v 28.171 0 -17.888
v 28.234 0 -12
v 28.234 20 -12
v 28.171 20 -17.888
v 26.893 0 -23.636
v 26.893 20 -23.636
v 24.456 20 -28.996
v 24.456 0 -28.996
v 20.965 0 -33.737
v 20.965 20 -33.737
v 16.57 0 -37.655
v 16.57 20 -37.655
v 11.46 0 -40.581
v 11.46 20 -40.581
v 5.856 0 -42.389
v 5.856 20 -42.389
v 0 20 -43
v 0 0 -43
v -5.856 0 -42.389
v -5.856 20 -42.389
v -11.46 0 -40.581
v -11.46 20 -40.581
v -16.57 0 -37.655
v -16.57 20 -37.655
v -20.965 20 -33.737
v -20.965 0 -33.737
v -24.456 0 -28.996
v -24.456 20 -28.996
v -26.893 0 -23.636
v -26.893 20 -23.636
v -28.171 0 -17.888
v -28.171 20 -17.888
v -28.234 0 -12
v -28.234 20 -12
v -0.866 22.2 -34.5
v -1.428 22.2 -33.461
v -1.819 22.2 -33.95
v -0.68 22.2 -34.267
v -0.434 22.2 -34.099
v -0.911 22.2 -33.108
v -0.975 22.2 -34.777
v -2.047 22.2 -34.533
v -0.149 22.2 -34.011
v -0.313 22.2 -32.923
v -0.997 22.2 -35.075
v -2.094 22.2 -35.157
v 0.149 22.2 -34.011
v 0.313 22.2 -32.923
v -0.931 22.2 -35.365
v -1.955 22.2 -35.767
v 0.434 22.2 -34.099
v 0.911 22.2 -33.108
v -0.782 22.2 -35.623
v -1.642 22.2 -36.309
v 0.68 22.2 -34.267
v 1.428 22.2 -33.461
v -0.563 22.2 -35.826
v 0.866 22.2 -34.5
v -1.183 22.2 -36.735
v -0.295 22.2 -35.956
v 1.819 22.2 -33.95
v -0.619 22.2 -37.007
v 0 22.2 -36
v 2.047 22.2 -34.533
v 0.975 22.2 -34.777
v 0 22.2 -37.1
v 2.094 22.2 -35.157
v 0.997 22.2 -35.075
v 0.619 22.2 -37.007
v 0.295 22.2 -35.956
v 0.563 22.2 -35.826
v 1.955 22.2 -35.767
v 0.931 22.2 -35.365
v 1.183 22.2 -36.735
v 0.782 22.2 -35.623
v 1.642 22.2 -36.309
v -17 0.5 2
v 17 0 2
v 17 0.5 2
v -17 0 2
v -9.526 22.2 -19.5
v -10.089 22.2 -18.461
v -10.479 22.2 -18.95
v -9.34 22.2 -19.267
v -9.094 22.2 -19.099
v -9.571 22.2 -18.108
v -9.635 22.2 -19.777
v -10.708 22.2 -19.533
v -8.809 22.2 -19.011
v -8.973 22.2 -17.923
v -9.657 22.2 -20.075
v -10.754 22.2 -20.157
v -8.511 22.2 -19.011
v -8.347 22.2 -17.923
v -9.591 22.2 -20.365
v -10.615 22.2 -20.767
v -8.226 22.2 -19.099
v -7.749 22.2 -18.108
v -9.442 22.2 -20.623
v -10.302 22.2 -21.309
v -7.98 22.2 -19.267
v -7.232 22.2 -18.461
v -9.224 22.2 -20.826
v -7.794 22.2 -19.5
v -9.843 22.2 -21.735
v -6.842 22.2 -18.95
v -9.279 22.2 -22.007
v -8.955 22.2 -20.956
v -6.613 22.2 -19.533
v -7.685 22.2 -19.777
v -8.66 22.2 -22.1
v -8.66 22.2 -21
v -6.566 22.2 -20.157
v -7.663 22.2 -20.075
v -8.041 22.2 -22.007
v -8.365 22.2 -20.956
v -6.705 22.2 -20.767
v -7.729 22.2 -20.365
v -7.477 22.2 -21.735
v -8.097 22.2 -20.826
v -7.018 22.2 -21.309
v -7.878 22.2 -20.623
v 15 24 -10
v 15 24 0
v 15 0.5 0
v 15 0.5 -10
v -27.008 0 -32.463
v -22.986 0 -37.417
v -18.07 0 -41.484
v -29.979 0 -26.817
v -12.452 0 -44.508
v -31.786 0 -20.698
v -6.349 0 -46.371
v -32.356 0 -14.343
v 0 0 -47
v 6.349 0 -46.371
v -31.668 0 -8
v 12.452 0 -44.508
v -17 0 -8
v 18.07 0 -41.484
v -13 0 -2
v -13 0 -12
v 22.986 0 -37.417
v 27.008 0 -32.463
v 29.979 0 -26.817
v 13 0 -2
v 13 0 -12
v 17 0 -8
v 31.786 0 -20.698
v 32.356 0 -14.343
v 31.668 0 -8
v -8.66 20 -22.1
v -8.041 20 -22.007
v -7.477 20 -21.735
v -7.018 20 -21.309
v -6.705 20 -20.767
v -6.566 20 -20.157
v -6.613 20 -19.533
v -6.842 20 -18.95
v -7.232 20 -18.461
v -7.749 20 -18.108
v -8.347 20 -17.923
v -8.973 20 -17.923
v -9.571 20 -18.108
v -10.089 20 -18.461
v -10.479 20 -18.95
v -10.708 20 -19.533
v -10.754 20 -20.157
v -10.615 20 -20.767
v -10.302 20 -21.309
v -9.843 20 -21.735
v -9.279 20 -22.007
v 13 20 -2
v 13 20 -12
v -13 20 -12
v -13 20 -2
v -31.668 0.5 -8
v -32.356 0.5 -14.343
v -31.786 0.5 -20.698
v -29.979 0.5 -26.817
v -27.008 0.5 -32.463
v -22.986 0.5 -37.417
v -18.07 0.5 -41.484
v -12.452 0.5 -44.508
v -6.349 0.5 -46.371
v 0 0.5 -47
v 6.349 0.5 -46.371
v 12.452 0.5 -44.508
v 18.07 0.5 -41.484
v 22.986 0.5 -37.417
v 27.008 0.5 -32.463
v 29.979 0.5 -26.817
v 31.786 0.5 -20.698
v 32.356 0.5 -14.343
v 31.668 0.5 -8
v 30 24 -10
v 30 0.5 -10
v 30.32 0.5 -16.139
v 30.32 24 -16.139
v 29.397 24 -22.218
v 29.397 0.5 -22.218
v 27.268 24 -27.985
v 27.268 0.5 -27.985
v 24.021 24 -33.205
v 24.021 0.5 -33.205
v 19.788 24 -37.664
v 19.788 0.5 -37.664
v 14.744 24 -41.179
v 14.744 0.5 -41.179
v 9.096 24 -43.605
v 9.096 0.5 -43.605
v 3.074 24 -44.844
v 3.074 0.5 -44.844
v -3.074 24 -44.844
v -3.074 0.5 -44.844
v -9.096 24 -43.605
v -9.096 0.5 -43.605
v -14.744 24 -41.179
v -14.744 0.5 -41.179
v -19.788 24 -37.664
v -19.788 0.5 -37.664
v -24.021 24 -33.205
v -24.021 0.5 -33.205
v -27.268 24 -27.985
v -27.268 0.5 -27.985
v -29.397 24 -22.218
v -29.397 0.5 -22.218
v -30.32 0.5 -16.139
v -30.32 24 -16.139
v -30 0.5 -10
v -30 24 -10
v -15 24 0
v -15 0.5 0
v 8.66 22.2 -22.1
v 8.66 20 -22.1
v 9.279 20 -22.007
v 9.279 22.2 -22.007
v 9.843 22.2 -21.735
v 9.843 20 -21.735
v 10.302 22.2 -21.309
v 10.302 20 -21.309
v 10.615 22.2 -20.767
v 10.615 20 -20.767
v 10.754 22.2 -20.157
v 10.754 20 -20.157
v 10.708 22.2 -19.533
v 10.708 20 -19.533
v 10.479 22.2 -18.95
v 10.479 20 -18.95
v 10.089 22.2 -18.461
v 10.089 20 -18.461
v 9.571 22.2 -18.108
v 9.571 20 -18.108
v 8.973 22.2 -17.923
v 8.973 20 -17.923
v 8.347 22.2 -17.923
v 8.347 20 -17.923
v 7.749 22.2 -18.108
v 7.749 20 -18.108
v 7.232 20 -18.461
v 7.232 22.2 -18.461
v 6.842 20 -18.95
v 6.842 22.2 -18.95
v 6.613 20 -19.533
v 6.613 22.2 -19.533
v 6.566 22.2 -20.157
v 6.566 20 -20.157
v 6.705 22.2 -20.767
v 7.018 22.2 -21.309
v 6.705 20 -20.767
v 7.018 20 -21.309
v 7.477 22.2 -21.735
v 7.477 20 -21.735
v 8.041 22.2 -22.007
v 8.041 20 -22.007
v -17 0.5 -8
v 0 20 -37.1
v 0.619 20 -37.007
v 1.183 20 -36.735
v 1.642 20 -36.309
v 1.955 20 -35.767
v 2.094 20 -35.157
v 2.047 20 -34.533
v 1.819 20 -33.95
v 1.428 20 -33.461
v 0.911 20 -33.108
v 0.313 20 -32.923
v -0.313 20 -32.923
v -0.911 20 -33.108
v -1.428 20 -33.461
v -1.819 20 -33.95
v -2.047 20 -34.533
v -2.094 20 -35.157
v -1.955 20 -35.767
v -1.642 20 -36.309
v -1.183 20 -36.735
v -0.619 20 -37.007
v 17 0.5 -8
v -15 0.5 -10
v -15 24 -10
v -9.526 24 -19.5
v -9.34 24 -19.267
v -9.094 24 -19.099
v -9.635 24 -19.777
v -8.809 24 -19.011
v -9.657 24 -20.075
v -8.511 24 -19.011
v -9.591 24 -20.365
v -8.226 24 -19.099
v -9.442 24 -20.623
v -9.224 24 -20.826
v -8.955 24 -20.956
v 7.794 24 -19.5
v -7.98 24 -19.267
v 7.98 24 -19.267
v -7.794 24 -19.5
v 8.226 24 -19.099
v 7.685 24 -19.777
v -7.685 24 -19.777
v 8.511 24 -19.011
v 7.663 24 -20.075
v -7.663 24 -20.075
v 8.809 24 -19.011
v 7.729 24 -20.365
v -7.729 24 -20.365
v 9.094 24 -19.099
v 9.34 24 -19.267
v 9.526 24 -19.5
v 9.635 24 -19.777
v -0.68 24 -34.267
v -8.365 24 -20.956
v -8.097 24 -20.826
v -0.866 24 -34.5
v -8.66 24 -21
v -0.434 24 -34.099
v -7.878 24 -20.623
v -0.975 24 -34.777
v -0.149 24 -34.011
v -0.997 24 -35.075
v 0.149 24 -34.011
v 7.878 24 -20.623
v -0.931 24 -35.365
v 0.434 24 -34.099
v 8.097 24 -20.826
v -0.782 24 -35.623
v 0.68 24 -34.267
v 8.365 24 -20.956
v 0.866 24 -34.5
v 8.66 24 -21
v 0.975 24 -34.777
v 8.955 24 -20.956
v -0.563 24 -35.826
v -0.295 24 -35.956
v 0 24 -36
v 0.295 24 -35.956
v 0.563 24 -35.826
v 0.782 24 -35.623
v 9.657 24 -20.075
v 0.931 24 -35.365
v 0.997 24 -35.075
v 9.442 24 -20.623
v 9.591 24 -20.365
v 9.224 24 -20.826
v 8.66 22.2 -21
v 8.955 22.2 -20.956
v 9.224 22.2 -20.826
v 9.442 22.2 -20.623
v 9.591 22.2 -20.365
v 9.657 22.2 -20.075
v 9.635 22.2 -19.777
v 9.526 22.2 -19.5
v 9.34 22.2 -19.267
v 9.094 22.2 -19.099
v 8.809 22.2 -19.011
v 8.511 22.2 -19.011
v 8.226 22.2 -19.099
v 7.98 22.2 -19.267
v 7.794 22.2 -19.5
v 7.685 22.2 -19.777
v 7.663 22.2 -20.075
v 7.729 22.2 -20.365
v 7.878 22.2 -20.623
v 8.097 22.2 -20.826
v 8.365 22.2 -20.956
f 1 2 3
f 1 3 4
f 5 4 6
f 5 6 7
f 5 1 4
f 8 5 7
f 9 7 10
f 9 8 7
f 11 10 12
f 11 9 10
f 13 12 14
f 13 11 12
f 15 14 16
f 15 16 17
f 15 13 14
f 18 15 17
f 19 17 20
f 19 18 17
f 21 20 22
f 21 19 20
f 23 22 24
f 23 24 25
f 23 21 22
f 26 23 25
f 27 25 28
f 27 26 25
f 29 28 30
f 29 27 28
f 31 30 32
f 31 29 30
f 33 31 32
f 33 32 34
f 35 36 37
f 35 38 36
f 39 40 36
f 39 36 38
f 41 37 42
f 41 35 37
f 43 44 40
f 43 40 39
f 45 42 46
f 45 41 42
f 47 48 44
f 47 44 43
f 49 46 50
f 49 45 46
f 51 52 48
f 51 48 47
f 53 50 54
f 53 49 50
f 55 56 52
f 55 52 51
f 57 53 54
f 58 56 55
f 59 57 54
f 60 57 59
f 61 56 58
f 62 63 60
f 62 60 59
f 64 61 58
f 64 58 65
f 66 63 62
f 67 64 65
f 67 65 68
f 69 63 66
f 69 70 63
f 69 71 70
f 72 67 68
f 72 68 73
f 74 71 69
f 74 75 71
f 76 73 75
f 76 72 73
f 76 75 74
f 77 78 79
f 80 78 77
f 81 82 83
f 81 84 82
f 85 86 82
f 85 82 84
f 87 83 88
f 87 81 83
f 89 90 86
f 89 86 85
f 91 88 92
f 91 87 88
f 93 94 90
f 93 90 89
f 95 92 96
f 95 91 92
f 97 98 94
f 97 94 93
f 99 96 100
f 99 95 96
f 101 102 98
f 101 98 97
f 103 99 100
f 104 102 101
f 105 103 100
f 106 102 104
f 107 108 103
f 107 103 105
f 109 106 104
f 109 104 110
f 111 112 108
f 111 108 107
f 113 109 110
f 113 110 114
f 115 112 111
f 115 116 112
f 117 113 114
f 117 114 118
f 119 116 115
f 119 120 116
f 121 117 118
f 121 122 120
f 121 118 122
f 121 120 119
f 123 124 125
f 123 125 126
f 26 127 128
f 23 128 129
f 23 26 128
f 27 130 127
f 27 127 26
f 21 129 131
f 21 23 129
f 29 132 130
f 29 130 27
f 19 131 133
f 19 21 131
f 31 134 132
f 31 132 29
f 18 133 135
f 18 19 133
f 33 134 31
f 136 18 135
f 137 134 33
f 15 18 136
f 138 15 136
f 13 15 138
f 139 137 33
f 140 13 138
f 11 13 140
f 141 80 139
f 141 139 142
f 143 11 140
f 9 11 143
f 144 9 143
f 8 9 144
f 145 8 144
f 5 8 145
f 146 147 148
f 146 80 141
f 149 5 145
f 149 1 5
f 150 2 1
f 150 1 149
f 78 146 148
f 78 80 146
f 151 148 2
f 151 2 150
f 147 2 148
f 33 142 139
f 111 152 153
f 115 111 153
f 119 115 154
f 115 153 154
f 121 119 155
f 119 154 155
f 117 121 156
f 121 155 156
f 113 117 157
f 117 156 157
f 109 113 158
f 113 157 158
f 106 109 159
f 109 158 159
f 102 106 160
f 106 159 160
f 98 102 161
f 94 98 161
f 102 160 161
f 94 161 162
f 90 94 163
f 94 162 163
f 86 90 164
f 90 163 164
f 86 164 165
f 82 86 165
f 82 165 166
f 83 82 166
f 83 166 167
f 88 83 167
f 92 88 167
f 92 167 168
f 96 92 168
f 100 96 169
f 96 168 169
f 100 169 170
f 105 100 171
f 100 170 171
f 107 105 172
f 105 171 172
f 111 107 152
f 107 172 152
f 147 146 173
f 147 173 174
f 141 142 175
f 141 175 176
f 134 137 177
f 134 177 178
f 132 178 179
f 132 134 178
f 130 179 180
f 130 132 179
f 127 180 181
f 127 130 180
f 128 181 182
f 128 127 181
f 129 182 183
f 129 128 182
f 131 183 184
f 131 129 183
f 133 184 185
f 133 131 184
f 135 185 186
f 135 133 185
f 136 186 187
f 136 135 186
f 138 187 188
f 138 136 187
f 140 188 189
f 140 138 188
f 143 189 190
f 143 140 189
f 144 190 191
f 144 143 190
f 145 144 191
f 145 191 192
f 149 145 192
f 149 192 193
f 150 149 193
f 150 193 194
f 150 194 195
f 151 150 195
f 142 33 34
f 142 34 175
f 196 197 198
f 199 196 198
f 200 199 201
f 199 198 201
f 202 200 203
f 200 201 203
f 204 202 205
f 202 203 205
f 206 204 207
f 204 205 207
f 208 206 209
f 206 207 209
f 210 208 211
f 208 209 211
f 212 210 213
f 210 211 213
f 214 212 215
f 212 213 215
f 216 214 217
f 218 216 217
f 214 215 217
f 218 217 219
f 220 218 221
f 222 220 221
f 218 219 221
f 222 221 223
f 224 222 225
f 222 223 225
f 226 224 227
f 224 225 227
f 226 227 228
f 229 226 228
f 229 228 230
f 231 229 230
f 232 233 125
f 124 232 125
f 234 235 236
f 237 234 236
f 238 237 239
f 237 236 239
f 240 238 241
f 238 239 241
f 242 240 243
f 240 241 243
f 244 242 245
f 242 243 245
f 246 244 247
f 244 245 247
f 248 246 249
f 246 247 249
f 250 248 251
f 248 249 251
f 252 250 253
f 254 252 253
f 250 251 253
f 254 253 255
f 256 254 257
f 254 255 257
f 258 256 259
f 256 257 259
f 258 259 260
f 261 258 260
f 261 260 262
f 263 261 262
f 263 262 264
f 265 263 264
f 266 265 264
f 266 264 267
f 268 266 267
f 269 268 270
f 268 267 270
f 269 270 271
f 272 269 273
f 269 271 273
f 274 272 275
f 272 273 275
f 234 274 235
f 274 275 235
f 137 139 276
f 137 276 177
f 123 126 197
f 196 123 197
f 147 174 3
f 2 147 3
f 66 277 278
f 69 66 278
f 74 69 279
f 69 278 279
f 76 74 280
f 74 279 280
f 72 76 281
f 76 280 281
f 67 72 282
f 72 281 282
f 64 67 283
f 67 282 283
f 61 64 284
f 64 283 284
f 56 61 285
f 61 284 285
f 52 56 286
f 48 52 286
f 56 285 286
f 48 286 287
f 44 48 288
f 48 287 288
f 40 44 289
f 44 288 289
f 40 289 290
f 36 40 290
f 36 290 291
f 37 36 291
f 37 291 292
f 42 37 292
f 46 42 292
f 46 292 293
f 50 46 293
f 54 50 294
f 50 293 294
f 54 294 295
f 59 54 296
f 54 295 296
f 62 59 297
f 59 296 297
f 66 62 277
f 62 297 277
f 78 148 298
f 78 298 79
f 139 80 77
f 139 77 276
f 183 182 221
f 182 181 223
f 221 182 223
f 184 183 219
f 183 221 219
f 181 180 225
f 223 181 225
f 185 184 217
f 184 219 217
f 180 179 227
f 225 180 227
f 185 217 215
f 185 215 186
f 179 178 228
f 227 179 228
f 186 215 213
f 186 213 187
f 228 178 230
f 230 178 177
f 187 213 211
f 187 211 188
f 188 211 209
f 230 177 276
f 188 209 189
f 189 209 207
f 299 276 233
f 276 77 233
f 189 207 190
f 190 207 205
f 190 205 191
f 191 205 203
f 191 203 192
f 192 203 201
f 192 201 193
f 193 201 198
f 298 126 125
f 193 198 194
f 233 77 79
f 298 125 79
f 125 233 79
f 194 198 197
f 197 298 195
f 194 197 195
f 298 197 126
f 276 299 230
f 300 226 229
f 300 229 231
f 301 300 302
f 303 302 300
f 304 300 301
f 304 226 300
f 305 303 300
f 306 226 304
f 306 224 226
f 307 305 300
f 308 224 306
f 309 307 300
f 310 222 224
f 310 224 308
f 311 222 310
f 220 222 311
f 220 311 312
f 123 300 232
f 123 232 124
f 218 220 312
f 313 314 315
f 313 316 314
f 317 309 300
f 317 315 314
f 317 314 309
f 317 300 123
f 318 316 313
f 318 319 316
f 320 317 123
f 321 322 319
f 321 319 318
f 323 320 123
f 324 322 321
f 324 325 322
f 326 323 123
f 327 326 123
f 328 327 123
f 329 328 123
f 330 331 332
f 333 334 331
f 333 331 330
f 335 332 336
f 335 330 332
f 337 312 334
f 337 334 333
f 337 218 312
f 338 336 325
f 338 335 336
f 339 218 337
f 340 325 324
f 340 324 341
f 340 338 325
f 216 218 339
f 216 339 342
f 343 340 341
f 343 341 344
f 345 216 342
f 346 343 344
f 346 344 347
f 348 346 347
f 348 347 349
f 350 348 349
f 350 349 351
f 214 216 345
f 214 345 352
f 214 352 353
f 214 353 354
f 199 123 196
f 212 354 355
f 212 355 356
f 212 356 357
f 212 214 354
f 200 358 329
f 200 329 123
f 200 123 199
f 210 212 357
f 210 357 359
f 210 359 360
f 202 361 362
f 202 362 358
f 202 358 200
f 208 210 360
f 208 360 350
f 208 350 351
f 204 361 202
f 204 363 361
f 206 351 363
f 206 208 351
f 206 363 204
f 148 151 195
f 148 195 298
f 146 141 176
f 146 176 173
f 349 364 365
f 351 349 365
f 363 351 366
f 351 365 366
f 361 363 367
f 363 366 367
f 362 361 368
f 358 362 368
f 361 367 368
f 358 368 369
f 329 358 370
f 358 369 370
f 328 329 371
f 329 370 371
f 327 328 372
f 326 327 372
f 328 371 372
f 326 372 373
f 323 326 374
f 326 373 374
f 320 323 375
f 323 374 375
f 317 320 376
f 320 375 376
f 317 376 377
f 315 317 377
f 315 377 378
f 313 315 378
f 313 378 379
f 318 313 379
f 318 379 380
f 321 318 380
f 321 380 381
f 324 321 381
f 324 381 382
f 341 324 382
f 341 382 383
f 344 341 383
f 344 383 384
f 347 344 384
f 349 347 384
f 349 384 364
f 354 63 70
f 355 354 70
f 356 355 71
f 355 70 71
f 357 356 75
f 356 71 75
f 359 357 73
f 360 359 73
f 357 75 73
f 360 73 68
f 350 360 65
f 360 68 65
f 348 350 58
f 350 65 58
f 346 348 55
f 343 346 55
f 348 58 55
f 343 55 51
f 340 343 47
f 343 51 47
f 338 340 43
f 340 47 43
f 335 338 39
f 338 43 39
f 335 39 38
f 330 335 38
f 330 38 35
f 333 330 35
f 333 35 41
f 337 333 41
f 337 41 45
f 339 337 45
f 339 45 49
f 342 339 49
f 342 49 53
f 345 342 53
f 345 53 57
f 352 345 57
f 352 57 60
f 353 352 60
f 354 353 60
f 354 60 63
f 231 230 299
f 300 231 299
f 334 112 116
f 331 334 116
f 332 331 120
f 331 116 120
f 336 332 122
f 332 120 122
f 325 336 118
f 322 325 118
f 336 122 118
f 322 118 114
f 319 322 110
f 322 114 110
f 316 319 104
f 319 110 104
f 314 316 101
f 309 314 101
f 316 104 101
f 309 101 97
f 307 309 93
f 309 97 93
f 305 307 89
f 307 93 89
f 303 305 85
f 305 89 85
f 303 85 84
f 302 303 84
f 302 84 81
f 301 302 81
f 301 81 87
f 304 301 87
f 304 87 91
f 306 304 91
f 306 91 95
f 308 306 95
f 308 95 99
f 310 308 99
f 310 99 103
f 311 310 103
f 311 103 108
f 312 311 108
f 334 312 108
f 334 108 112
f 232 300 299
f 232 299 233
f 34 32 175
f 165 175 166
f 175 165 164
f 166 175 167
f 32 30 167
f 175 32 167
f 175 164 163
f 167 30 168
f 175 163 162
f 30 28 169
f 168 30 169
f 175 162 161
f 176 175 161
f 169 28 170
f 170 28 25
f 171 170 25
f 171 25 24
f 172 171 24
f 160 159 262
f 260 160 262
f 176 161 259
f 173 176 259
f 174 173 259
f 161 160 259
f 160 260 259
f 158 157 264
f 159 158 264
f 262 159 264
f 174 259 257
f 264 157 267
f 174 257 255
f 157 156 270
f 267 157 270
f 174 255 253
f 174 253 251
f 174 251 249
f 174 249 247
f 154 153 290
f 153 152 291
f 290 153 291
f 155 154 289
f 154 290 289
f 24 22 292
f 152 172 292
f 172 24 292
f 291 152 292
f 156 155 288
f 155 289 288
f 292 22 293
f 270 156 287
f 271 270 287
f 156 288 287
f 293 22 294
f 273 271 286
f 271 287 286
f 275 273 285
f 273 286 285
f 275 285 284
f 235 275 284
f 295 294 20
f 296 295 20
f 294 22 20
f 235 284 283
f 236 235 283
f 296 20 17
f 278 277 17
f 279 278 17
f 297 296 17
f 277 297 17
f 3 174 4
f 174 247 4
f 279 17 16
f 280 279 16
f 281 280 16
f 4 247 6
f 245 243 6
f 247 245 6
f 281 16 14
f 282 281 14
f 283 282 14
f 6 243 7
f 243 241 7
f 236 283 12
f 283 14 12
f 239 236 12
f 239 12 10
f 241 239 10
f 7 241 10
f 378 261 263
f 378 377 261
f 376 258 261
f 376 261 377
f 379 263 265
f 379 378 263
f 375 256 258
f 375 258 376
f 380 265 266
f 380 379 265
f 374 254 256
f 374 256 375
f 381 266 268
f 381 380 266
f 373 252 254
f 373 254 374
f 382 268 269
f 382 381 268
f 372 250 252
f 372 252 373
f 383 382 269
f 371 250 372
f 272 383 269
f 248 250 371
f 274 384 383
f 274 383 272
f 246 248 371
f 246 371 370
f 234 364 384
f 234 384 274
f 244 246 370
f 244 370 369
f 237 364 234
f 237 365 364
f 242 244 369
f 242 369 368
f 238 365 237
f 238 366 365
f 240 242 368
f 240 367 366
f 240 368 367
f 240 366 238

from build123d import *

# Parameters (mm, degrees)
EXTRUIR_L_MINA1_DEPTH   = 20
SALIENTE_EXTRUIR1_DEPTH = 4
CROQUIS3_R              = 2.1
CORTAR_EXTRUIR2_DEPTH   = 2.2
SALIENTE_EXTRUIR3_DEPTH = 0.5
CROQUIS5_R              = 1
CORTAR_EXTRUIR3_DEPTH   = 10


with BuildPart() as part:
    # Croquis1 → Extruir-Lámina1 (new body)
    with BuildSketch(Plane(origin=(0, 0, 0), x_dir=(1, 0, 0), z_dir=(0, 1, 0))):
        with BuildLine():
            Line((-30, 10), (-15, 10))
            Line((-15, 10), (-15, 0))
            Line((-15, 0), (15, 0))
            Line((15, 0), (15, 10))
            Line((15, 10), (30, 10))
            ThreePointArc((30, 10), (0, 45), (-30, 10))
        make_face()
        with BuildLine():
            Line((-28.233718443, 12), (-13, 12))
            Line((-13, 12), (-13, 2))
            Line((-13, 2), (13, 2))
            Line((13, 2), (13, 12))
            Line((13, 12), (28.233718443, 12))
            ThreePointArc((28.233718443, 12), (0, 43), (-28.233718443, 12))
        make_face(mode=Mode.SUBTRACT)
    extrude(amount=EXTRUIR_L_MINA1_DEPTH)

    # Croquis2 → Saliente-Extruir1 (add)
    with BuildSketch(Plane(origin=(0, 20, 0), x_dir=(1, 0, 0), z_dir=(0, 1, 0))):
        with BuildLine():
            Line((15, 10), (30, 10))
            ThreePointArc((30, 10), (0, 45), (-30, 10))
            Line((-30, 10), (-15, 10))
            Line((-15, 10), (-15, 0))
            Line((-15, 0), (15, 0))
            Line((15, 0), (15, 10))
        make_face()
    extrude(amount=SALIENTE_EXTRUIR1_DEPTH)

    # Croquis3 → Cortar-Extruir2 (cut)
    with BuildSketch(Plane.XZ.offset(-20)):
        with Locations(Location((-8.660254038, -20, 0), (0, 0, 270))):
            Circle(CROQUIS3_R)
        with Locations(Location((8.660254038, -20, 0), (0, 0, 270))):
            Circle(CROQUIS3_R)
        with Locations(Location((0, -35, 0), (0, 0, 270))):
            Circle(CROQUIS3_R)
    extrude(amount=-CORTAR_EXTRUIR2_DEPTH, mode=Mode.SUBTRACT)

    # Croquis4 → Saliente-Extruir3 (add)
    with BuildSketch(Plane.XZ):
        with BuildLine():
            Line((17, 2), (-17, 2))
            Line((-17, 2), (-17, -8))
            Line((-17, -8), (-31.667919775, -8))
            ThreePointArc((-31.667919775, -8), (0, -47), (31.667919775, -8))
            Line((31.667919775, -8), (17, -8))
            Line((17, -8), (17, 2))
        make_face()
        with BuildLine():
            Line((13, -12), (28.233718443, -12))
            ThreePointArc((28.233718443, -12), (0, -43), (-28.233718443, -12))
            Line((-28.233718443, -12), (-13, -12))
            Line((-13, -12), (-13, -2))
            Line((-13, -2), (13, -2))
            Line((13, -2), (13, -12))
        make_face(mode=Mode.SUBTRACT)
    extrude(amount=-SALIENTE_EXTRUIR3_DEPTH)

    # Croquis5 → Cortar-Extruir3 (cut)
    with BuildSketch(Plane.XZ.offset(-20)):
        with Locations(Location((-8.660254038, -20, 0), (0, 0, 270))):
            Circle(CROQUIS5_R)
        with Locations(Location((8.660254038, -20, 0), (0, 0, 270))):
            Circle(CROQUIS5_R)
        with Locations(Location((0, -35, 0), (0, 0, 270))):
            Circle(CROQUIS5_R)
    extrude(amount=-CORTAR_EXTRUIR3_DEPTH, mode=Mode.SUBTRACT)


solid = part.part
